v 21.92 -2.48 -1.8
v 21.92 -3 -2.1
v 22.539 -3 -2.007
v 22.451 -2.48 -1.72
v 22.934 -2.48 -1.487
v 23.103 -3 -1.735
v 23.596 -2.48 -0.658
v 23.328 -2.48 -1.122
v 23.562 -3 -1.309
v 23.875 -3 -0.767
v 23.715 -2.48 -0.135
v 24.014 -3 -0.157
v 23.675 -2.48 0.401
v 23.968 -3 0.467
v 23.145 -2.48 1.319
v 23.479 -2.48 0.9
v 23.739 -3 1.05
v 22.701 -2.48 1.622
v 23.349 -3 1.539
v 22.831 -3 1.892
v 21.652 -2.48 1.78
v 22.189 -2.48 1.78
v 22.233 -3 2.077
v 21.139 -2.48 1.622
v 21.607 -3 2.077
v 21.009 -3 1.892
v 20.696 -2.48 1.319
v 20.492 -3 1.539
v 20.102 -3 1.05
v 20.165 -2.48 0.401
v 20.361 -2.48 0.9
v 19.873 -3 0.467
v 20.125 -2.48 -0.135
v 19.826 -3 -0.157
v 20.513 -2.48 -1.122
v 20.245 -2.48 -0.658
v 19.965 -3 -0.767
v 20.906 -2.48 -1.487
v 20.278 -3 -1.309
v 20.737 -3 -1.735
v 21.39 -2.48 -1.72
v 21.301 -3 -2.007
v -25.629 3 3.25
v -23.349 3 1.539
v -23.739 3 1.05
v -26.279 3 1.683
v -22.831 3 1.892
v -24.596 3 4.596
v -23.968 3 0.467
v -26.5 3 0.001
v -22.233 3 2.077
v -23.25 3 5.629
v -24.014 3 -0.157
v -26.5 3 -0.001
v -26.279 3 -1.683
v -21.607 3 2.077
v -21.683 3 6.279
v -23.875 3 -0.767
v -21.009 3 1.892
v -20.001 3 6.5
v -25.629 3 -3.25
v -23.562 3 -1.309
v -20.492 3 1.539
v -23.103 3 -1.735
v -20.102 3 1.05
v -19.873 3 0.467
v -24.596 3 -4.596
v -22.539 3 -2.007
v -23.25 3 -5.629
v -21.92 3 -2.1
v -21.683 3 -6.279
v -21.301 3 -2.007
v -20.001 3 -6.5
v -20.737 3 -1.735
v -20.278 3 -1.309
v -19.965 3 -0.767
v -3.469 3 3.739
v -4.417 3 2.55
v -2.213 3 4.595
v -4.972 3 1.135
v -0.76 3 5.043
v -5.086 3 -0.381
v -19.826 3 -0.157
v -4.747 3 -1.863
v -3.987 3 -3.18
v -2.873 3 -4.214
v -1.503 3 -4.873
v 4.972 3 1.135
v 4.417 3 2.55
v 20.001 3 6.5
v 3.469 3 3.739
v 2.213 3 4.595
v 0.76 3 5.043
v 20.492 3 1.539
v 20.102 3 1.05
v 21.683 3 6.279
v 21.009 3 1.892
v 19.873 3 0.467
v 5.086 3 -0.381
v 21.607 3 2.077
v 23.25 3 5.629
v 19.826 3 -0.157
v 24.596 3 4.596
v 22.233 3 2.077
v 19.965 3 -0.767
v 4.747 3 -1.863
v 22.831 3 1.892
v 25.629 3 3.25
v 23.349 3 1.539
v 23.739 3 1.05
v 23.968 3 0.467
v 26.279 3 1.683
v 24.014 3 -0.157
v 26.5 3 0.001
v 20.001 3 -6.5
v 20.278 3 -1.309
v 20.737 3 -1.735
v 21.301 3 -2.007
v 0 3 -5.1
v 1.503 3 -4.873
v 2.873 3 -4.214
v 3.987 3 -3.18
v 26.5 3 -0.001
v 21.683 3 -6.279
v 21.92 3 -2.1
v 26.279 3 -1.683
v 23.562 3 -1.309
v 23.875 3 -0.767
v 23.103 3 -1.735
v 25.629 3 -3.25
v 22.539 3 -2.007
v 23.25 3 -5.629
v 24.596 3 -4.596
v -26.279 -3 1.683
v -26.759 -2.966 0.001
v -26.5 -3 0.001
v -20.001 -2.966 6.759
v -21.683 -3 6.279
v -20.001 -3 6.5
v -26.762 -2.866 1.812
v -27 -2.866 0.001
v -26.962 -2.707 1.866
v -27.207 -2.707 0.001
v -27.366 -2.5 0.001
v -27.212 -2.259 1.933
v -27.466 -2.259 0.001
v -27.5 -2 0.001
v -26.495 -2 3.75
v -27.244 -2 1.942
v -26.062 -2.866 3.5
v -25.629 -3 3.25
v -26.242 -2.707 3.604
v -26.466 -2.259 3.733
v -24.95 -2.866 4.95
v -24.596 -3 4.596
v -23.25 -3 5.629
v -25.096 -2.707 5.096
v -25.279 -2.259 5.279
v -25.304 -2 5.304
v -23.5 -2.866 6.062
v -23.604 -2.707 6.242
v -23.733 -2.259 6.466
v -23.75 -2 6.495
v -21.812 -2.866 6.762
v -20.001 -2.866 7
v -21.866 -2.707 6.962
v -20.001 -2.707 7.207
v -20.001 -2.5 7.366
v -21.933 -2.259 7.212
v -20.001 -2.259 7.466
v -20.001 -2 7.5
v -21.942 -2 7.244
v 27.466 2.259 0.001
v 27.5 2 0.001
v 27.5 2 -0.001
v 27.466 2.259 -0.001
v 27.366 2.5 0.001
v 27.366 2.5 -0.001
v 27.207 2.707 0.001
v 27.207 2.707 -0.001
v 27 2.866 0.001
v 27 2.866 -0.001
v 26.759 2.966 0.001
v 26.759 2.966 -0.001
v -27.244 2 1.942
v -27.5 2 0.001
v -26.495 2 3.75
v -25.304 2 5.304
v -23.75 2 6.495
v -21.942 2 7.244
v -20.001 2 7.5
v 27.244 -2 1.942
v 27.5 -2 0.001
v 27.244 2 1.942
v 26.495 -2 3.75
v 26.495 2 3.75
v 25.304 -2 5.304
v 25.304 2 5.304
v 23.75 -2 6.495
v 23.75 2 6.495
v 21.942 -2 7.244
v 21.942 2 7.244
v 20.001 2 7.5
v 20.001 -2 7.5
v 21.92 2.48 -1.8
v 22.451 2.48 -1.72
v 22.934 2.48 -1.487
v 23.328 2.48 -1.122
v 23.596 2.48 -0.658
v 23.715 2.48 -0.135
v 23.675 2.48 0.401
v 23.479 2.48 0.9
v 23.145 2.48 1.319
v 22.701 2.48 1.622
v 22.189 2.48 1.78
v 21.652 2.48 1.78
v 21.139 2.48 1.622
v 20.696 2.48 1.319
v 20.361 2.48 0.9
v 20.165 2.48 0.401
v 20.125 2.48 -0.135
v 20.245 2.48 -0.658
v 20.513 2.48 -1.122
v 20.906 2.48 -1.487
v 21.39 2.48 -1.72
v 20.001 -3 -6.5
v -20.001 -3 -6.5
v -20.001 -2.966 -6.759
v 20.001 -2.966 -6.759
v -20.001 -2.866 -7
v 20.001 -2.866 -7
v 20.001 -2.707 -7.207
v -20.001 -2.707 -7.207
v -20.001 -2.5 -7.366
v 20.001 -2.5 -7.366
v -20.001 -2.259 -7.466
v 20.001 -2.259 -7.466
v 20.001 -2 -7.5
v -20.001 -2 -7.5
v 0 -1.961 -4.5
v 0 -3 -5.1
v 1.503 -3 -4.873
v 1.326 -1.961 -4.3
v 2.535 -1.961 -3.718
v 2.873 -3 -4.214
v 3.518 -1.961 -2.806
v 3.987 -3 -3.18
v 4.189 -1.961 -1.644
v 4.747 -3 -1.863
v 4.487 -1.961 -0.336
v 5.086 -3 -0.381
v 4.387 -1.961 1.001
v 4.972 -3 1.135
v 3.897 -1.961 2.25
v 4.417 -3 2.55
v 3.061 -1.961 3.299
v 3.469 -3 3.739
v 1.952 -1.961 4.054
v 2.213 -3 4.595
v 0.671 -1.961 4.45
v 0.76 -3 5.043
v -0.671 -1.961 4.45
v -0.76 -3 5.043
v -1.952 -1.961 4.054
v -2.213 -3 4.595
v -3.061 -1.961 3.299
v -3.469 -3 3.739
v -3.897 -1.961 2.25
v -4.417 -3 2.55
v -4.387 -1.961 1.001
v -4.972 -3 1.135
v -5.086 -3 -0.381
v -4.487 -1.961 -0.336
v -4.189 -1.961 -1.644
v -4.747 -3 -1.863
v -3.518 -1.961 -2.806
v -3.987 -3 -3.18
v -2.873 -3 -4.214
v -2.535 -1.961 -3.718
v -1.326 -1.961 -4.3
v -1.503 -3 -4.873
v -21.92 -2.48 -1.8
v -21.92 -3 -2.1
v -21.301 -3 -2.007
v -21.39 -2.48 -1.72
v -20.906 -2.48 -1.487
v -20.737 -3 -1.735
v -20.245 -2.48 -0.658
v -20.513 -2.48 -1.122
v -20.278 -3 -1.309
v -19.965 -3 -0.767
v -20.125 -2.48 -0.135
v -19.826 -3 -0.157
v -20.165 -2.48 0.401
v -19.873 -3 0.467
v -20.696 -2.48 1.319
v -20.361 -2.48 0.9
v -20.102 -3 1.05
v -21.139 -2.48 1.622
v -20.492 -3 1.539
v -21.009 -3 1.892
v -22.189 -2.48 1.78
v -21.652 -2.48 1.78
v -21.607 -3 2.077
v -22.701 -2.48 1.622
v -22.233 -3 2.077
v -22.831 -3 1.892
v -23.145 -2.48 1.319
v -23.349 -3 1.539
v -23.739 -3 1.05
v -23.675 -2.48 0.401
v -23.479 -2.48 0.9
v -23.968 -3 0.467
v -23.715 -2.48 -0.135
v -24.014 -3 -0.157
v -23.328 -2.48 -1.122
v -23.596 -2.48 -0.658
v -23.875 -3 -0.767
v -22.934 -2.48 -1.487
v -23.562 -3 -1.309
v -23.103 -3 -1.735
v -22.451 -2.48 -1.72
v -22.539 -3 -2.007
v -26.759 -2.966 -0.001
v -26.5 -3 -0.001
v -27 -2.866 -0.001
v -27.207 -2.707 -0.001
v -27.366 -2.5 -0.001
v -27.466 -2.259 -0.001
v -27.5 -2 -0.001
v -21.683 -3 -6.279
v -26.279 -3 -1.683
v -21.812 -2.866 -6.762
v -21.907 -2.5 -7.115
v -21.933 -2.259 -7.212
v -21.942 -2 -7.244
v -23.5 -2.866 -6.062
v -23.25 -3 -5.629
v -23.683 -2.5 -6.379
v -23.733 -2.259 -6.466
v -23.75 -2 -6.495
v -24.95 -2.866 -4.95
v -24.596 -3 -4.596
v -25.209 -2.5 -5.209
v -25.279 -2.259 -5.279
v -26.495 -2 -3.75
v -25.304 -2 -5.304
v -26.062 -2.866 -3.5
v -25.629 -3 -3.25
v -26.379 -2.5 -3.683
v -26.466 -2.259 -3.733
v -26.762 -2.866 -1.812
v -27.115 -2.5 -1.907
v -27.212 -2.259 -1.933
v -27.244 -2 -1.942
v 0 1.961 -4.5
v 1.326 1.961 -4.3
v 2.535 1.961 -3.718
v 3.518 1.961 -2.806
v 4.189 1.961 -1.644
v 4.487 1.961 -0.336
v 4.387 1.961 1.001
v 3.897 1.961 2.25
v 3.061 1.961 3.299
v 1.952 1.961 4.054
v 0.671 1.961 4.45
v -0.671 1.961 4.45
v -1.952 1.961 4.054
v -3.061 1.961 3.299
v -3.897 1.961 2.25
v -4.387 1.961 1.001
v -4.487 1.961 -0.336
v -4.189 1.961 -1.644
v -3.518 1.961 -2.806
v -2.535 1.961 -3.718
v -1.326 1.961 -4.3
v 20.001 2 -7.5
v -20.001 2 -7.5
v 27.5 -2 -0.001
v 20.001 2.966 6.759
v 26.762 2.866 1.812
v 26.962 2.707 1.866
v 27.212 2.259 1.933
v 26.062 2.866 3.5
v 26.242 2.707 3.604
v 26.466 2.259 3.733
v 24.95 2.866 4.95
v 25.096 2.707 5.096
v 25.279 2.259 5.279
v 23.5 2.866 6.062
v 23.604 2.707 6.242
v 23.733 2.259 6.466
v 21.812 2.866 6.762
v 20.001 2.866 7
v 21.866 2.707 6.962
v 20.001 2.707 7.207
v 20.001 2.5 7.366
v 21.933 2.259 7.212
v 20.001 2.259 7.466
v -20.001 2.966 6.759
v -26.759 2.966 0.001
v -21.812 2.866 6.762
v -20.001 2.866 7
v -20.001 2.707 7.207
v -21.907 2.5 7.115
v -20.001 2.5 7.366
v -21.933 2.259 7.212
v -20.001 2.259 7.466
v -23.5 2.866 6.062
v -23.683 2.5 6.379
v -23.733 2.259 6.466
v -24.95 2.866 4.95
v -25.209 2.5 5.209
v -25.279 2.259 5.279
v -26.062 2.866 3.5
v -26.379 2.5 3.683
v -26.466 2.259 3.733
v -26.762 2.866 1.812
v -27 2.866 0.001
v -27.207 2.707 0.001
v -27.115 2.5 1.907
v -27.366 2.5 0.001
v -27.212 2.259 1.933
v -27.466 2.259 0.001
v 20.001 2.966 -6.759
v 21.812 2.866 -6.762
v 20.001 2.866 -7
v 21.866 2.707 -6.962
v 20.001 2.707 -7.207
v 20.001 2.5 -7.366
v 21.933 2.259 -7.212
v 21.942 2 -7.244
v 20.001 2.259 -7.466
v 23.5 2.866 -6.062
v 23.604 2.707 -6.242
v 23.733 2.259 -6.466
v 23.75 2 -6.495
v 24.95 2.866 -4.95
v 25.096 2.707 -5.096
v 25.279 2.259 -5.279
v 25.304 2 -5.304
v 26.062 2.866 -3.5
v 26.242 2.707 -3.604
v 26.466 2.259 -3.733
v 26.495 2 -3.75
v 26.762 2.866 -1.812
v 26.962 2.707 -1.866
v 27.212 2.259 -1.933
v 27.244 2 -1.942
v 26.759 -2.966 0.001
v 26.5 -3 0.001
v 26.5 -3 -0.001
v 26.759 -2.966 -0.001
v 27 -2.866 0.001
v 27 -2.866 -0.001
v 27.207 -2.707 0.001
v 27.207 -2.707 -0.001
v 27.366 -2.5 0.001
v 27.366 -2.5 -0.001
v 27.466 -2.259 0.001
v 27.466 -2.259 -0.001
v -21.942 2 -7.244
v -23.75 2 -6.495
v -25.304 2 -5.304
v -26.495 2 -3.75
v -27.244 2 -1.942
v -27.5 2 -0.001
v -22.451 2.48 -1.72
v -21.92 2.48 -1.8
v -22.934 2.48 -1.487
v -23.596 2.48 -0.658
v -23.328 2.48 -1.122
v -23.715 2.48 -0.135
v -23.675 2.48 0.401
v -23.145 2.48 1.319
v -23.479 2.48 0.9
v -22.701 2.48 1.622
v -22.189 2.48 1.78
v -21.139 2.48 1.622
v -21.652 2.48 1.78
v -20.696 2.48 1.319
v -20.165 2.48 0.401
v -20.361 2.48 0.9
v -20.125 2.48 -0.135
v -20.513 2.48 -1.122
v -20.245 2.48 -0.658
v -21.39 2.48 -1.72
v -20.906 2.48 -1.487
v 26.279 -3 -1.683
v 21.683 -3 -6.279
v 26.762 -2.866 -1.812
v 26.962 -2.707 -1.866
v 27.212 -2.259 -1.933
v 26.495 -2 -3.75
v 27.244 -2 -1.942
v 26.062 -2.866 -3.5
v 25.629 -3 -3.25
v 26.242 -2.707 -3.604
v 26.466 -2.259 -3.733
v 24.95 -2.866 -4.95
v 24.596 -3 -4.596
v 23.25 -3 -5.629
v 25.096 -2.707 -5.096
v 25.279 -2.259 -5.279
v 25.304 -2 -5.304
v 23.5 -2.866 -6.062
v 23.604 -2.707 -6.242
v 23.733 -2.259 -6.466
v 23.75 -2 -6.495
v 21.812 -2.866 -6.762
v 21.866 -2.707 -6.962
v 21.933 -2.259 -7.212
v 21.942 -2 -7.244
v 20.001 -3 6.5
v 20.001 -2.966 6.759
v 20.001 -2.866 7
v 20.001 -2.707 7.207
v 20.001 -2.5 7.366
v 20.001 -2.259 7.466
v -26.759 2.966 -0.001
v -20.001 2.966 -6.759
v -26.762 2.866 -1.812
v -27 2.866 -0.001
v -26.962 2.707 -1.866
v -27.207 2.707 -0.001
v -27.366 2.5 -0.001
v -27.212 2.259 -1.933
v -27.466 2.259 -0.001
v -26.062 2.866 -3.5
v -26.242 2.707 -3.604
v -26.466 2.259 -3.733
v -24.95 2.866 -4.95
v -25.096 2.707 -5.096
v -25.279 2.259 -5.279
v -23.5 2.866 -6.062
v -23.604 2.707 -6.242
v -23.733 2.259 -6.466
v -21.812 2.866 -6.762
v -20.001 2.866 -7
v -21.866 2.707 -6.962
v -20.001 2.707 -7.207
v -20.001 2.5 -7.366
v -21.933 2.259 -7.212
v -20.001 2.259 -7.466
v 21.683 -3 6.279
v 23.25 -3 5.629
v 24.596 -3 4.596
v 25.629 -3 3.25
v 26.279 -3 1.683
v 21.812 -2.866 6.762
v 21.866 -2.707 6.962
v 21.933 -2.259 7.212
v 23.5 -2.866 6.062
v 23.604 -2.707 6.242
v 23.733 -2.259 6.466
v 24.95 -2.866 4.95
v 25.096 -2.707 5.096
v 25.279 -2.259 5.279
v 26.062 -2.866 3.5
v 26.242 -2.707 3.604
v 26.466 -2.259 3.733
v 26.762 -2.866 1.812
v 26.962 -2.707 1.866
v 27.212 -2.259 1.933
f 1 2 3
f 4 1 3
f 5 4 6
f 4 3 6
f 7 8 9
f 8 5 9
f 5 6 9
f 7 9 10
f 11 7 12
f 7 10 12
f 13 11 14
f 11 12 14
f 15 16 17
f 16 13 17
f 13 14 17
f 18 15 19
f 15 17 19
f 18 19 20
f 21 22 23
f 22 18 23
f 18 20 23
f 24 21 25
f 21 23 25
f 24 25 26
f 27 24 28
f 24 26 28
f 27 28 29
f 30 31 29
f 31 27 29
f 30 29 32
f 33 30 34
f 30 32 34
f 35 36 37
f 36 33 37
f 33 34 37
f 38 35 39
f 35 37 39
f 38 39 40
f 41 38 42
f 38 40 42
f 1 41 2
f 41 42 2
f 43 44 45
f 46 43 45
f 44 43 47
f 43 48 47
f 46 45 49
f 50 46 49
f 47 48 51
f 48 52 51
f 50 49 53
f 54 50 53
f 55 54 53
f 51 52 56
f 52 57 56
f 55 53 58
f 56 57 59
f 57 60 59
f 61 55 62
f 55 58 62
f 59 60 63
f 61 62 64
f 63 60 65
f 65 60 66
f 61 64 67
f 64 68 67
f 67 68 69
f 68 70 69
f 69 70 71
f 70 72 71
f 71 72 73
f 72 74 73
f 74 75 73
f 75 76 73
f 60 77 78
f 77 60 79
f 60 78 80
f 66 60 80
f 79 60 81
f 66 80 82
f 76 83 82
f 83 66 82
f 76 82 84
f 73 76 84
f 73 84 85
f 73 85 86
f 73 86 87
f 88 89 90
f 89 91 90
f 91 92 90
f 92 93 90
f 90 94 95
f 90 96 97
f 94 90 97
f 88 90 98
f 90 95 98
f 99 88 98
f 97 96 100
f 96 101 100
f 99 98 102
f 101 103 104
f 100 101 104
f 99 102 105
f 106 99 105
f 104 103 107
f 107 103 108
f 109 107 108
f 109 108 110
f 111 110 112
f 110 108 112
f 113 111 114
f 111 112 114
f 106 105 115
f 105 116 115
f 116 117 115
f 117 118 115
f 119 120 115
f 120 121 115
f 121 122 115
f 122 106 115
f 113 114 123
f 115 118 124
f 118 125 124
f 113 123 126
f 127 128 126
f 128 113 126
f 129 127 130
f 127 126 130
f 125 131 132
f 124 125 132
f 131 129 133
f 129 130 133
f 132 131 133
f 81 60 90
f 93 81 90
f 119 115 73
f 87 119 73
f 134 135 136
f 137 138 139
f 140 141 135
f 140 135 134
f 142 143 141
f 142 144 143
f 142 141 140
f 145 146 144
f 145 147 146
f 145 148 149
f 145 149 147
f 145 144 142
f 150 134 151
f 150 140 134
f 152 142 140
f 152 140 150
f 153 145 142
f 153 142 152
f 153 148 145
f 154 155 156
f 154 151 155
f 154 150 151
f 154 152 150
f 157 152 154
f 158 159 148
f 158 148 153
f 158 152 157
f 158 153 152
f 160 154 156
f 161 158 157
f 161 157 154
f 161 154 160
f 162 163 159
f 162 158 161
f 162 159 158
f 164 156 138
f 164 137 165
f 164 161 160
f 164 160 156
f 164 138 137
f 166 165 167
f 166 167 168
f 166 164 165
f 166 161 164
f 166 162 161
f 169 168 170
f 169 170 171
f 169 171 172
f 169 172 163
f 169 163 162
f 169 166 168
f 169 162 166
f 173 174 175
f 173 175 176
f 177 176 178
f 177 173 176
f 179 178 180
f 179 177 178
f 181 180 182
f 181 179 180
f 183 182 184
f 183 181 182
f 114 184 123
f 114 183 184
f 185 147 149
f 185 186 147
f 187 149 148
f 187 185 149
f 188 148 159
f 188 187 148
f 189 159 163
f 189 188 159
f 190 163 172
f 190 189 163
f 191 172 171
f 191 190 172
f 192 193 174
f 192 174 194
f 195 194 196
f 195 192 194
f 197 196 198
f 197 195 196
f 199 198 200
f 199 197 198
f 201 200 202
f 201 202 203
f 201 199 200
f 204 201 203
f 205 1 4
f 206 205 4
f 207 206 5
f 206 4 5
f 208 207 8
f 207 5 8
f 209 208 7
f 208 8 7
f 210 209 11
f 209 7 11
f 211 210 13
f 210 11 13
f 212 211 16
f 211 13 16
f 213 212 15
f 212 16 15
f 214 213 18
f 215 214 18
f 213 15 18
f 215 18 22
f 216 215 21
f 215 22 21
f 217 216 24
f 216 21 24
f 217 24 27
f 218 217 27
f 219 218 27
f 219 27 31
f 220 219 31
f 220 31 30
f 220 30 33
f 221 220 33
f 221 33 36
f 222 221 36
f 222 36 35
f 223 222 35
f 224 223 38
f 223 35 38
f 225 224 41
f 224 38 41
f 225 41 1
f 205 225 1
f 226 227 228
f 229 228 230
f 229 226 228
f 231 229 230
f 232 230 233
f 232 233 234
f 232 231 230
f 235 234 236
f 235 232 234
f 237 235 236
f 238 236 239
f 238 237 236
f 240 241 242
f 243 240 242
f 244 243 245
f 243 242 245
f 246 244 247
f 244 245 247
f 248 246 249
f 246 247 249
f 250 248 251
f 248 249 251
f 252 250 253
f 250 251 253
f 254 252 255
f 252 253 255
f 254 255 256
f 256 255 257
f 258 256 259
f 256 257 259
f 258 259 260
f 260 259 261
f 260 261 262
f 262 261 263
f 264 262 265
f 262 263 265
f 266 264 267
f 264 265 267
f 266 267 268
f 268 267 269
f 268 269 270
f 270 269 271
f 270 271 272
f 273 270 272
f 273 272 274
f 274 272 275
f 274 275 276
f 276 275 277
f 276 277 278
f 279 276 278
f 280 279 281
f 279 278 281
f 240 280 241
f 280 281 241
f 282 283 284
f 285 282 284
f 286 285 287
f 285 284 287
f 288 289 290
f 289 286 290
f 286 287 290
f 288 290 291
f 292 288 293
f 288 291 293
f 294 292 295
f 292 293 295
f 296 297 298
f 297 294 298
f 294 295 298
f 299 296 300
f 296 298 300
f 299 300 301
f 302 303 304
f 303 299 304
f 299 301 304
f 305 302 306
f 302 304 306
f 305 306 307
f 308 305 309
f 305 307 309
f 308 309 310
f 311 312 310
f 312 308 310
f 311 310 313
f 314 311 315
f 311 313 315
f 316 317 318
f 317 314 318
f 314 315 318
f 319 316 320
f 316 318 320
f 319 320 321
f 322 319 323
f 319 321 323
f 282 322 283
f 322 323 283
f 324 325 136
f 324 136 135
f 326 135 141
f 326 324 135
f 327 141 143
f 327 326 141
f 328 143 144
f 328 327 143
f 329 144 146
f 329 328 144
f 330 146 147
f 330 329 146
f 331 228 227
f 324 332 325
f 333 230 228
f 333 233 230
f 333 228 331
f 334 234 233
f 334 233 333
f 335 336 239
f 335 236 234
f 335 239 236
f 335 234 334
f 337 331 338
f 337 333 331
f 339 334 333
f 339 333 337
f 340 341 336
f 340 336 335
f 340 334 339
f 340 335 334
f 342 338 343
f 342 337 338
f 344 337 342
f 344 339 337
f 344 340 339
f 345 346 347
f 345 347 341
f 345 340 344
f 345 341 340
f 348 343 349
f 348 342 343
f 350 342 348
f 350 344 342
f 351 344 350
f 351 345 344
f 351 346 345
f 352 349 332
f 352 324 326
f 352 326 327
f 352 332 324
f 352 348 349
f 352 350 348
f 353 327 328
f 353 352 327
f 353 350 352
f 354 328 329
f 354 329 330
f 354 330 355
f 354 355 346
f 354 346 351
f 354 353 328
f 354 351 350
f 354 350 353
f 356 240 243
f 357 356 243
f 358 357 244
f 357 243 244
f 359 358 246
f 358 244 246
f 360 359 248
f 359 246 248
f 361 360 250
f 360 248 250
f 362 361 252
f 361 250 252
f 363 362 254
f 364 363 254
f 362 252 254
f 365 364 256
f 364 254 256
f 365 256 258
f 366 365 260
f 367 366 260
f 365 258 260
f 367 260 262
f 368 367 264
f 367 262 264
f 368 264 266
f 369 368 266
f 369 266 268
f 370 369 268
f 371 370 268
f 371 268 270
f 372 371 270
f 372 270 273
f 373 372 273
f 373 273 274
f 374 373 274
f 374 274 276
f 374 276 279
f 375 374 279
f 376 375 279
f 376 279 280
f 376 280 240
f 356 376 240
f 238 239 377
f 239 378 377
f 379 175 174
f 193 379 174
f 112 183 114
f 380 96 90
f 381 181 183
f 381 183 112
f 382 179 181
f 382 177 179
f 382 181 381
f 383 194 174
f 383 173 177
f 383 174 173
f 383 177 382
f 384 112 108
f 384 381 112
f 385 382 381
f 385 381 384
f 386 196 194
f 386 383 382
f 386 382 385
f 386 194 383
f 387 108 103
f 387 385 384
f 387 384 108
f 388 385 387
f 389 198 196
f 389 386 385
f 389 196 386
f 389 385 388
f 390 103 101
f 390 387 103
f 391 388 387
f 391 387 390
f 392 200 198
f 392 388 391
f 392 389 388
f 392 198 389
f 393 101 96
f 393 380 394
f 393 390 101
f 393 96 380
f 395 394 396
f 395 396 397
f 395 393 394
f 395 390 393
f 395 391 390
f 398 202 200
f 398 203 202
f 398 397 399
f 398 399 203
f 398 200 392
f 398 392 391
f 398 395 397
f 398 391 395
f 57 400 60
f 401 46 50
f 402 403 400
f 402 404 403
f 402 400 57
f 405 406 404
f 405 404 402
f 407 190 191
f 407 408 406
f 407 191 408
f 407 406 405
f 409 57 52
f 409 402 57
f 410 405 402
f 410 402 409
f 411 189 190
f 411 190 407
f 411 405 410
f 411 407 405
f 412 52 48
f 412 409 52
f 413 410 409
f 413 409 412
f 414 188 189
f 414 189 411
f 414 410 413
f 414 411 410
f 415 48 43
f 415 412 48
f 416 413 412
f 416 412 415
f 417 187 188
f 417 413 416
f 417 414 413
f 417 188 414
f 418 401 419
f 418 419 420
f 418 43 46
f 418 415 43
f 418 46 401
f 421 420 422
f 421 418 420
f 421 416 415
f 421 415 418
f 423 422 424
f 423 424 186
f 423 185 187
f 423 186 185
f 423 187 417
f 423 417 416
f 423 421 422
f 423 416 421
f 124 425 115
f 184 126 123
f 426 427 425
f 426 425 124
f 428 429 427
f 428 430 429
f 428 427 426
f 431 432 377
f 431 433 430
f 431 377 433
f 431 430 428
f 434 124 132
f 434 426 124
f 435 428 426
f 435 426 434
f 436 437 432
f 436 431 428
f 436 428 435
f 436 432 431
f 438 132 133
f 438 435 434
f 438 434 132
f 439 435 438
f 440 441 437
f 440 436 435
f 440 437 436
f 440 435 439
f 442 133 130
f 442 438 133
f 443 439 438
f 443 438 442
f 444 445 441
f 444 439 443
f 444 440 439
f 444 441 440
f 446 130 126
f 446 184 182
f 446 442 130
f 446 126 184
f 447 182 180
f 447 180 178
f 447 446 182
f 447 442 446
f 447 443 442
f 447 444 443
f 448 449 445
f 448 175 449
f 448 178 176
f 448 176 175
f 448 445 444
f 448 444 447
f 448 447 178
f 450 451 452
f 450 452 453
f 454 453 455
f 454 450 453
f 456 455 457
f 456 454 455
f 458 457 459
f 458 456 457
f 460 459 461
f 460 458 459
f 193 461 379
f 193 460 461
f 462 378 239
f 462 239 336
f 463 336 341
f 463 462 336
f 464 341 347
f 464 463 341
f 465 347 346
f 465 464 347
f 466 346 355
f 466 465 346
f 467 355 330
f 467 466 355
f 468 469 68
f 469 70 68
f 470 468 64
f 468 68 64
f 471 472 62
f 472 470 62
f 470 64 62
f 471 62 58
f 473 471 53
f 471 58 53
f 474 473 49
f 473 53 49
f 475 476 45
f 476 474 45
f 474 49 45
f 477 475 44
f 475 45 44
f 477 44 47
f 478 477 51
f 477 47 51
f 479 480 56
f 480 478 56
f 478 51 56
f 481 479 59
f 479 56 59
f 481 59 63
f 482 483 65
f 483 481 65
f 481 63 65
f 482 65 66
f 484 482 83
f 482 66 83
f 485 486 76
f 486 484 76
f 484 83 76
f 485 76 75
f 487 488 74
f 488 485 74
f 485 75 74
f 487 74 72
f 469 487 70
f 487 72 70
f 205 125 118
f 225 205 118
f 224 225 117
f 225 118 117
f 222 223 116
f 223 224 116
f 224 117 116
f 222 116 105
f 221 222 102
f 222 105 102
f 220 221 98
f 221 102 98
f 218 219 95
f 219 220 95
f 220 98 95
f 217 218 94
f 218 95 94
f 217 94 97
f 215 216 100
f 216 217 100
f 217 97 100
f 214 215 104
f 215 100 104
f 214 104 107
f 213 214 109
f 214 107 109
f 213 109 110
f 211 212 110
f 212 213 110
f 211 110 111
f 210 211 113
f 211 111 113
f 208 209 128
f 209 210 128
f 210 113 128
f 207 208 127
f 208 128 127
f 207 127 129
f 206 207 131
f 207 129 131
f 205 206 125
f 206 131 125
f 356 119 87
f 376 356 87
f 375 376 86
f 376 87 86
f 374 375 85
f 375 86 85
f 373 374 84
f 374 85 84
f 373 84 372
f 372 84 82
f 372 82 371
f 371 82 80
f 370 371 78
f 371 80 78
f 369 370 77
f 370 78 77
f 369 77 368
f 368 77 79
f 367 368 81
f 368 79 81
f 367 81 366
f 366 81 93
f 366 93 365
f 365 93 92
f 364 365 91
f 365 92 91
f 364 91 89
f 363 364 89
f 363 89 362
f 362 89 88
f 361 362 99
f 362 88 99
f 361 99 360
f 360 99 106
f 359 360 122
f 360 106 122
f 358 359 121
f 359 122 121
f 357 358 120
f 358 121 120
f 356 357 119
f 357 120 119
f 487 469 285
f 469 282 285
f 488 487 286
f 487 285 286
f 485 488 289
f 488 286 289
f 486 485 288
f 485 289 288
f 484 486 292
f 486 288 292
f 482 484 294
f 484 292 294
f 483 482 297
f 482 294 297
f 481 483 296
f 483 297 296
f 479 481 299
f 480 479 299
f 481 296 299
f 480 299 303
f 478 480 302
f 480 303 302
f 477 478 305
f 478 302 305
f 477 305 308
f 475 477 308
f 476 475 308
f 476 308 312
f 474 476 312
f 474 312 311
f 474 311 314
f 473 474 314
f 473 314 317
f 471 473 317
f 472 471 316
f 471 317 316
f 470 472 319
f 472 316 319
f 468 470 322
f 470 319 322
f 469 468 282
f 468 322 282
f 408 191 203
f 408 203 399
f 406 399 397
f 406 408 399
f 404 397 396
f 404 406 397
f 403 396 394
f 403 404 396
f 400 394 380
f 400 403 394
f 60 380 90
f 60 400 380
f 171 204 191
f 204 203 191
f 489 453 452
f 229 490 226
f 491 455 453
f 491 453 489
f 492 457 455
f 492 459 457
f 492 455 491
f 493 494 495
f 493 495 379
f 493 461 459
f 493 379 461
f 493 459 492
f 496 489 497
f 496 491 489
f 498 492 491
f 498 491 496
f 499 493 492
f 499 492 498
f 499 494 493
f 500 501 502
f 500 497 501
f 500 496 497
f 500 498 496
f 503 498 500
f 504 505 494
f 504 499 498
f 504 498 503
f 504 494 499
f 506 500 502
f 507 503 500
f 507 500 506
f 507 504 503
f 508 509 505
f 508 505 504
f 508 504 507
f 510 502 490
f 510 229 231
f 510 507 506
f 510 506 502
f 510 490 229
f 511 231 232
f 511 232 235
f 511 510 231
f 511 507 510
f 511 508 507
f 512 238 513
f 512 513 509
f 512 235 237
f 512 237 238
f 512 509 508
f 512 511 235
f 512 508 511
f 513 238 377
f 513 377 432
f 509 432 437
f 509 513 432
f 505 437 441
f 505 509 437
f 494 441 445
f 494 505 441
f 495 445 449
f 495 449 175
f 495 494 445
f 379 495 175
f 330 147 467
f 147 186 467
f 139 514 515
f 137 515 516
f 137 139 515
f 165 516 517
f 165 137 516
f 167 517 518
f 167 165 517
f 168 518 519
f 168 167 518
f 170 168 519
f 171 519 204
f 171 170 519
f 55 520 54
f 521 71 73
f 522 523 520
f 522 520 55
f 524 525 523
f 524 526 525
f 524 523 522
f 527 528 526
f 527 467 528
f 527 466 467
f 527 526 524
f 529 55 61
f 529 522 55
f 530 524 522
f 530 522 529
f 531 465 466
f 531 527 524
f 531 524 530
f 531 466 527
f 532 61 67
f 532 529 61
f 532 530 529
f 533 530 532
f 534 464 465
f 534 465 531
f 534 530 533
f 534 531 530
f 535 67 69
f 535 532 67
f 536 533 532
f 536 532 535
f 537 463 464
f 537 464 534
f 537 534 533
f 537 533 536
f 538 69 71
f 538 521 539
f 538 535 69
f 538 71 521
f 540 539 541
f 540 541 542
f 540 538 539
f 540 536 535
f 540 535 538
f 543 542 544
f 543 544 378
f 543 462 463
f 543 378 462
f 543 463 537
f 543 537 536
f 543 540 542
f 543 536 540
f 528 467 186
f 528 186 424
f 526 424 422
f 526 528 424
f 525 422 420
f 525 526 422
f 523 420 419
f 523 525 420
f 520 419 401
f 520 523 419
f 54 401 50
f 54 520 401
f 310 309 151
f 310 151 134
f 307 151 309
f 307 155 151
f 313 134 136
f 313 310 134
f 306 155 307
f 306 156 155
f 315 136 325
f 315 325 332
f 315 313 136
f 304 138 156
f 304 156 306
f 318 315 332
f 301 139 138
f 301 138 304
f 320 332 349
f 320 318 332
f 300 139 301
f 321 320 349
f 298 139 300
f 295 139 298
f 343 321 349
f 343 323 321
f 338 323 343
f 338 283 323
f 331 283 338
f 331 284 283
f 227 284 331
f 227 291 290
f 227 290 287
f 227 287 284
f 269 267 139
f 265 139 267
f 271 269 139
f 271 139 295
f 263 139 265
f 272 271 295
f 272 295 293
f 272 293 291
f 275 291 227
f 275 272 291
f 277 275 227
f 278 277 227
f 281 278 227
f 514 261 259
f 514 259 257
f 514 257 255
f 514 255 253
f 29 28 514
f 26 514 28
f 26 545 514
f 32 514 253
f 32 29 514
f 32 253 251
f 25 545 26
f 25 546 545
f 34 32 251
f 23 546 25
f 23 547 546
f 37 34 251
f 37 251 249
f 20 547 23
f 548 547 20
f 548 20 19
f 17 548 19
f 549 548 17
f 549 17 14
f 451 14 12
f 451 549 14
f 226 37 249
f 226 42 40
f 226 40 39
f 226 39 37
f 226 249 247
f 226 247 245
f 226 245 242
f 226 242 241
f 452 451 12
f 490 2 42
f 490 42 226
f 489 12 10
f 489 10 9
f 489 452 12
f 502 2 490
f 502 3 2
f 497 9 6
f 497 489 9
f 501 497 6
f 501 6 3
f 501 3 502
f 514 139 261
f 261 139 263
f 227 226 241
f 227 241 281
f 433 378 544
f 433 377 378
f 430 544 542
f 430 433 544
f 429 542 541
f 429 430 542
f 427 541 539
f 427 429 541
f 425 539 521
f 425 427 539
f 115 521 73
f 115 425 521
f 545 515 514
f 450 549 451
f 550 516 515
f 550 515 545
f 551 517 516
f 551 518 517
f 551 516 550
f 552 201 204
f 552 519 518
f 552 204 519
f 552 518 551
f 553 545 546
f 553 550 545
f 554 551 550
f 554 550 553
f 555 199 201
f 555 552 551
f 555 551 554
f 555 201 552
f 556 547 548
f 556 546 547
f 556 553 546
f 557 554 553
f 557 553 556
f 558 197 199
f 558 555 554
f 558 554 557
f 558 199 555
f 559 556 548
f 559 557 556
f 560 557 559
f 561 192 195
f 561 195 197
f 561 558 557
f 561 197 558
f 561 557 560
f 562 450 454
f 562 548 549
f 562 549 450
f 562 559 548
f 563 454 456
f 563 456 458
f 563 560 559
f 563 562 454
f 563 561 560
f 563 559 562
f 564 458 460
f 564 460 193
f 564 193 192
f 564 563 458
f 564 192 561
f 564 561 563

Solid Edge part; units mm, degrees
sketch "Sketch1" plane through (0, 0, 0) normal (0, -1, 0) x (1, 0, 0)
  line L0 (-27.5, -7.5) -> (27.5, -7.5)
  line L1 (27.5, -7.5) -> (27.5, 7.5)
  line L2 (27.5, 7.5) -> (-27.5, 7.5)
  line L3 (-27.5, 7.5) -> (-27.5, -7.5)
  dimension "D1" = 55
  dimension "D2" = 15
extrude "ExtrudedProtrusion_1" add sketch "Sketch1" along normal blind 3 and the other way blind 3
fillet "Round_1" radius 7.5 4 edges at (27.5, 0, 7.5) (27.5, 0, -7.5) (-27.5, 0, 7.5) (-27.5, 0, -7.5)
hole "Hole_1" at (21.9203, -3, 0) direction (0, 1, 0) diameter 3.6 end up to next start chamfer 0.3 start chamfer angle 30 end chamfer 0.3 end chamfer angle 30
hole "Hole1" at (-21.9203, -3, 0) direction (0, 1, 0) diameter 3.6 end up to next start chamfer 0.3 start chamfer angle 30 end chamfer 0.3 end chamfer angle 30
fillet "Round_2" radius 1 7 edges at (0, -3, -7.5) (27.5, -3, 0) (0, -3, 7.5) (-27.5, -3, 0) (-27.5, 3, 0) (0, 3, 7.5) (0, 3, -7.5)
hole "Hole_3" at (0, -3, 0) direction (0, 1, 0) diameter 9 end up to next start chamfer 0.6 start chamfer angle 30 end chamfer 0.6 end chamfer angle 30
properties material "Polyethylene, low density"
